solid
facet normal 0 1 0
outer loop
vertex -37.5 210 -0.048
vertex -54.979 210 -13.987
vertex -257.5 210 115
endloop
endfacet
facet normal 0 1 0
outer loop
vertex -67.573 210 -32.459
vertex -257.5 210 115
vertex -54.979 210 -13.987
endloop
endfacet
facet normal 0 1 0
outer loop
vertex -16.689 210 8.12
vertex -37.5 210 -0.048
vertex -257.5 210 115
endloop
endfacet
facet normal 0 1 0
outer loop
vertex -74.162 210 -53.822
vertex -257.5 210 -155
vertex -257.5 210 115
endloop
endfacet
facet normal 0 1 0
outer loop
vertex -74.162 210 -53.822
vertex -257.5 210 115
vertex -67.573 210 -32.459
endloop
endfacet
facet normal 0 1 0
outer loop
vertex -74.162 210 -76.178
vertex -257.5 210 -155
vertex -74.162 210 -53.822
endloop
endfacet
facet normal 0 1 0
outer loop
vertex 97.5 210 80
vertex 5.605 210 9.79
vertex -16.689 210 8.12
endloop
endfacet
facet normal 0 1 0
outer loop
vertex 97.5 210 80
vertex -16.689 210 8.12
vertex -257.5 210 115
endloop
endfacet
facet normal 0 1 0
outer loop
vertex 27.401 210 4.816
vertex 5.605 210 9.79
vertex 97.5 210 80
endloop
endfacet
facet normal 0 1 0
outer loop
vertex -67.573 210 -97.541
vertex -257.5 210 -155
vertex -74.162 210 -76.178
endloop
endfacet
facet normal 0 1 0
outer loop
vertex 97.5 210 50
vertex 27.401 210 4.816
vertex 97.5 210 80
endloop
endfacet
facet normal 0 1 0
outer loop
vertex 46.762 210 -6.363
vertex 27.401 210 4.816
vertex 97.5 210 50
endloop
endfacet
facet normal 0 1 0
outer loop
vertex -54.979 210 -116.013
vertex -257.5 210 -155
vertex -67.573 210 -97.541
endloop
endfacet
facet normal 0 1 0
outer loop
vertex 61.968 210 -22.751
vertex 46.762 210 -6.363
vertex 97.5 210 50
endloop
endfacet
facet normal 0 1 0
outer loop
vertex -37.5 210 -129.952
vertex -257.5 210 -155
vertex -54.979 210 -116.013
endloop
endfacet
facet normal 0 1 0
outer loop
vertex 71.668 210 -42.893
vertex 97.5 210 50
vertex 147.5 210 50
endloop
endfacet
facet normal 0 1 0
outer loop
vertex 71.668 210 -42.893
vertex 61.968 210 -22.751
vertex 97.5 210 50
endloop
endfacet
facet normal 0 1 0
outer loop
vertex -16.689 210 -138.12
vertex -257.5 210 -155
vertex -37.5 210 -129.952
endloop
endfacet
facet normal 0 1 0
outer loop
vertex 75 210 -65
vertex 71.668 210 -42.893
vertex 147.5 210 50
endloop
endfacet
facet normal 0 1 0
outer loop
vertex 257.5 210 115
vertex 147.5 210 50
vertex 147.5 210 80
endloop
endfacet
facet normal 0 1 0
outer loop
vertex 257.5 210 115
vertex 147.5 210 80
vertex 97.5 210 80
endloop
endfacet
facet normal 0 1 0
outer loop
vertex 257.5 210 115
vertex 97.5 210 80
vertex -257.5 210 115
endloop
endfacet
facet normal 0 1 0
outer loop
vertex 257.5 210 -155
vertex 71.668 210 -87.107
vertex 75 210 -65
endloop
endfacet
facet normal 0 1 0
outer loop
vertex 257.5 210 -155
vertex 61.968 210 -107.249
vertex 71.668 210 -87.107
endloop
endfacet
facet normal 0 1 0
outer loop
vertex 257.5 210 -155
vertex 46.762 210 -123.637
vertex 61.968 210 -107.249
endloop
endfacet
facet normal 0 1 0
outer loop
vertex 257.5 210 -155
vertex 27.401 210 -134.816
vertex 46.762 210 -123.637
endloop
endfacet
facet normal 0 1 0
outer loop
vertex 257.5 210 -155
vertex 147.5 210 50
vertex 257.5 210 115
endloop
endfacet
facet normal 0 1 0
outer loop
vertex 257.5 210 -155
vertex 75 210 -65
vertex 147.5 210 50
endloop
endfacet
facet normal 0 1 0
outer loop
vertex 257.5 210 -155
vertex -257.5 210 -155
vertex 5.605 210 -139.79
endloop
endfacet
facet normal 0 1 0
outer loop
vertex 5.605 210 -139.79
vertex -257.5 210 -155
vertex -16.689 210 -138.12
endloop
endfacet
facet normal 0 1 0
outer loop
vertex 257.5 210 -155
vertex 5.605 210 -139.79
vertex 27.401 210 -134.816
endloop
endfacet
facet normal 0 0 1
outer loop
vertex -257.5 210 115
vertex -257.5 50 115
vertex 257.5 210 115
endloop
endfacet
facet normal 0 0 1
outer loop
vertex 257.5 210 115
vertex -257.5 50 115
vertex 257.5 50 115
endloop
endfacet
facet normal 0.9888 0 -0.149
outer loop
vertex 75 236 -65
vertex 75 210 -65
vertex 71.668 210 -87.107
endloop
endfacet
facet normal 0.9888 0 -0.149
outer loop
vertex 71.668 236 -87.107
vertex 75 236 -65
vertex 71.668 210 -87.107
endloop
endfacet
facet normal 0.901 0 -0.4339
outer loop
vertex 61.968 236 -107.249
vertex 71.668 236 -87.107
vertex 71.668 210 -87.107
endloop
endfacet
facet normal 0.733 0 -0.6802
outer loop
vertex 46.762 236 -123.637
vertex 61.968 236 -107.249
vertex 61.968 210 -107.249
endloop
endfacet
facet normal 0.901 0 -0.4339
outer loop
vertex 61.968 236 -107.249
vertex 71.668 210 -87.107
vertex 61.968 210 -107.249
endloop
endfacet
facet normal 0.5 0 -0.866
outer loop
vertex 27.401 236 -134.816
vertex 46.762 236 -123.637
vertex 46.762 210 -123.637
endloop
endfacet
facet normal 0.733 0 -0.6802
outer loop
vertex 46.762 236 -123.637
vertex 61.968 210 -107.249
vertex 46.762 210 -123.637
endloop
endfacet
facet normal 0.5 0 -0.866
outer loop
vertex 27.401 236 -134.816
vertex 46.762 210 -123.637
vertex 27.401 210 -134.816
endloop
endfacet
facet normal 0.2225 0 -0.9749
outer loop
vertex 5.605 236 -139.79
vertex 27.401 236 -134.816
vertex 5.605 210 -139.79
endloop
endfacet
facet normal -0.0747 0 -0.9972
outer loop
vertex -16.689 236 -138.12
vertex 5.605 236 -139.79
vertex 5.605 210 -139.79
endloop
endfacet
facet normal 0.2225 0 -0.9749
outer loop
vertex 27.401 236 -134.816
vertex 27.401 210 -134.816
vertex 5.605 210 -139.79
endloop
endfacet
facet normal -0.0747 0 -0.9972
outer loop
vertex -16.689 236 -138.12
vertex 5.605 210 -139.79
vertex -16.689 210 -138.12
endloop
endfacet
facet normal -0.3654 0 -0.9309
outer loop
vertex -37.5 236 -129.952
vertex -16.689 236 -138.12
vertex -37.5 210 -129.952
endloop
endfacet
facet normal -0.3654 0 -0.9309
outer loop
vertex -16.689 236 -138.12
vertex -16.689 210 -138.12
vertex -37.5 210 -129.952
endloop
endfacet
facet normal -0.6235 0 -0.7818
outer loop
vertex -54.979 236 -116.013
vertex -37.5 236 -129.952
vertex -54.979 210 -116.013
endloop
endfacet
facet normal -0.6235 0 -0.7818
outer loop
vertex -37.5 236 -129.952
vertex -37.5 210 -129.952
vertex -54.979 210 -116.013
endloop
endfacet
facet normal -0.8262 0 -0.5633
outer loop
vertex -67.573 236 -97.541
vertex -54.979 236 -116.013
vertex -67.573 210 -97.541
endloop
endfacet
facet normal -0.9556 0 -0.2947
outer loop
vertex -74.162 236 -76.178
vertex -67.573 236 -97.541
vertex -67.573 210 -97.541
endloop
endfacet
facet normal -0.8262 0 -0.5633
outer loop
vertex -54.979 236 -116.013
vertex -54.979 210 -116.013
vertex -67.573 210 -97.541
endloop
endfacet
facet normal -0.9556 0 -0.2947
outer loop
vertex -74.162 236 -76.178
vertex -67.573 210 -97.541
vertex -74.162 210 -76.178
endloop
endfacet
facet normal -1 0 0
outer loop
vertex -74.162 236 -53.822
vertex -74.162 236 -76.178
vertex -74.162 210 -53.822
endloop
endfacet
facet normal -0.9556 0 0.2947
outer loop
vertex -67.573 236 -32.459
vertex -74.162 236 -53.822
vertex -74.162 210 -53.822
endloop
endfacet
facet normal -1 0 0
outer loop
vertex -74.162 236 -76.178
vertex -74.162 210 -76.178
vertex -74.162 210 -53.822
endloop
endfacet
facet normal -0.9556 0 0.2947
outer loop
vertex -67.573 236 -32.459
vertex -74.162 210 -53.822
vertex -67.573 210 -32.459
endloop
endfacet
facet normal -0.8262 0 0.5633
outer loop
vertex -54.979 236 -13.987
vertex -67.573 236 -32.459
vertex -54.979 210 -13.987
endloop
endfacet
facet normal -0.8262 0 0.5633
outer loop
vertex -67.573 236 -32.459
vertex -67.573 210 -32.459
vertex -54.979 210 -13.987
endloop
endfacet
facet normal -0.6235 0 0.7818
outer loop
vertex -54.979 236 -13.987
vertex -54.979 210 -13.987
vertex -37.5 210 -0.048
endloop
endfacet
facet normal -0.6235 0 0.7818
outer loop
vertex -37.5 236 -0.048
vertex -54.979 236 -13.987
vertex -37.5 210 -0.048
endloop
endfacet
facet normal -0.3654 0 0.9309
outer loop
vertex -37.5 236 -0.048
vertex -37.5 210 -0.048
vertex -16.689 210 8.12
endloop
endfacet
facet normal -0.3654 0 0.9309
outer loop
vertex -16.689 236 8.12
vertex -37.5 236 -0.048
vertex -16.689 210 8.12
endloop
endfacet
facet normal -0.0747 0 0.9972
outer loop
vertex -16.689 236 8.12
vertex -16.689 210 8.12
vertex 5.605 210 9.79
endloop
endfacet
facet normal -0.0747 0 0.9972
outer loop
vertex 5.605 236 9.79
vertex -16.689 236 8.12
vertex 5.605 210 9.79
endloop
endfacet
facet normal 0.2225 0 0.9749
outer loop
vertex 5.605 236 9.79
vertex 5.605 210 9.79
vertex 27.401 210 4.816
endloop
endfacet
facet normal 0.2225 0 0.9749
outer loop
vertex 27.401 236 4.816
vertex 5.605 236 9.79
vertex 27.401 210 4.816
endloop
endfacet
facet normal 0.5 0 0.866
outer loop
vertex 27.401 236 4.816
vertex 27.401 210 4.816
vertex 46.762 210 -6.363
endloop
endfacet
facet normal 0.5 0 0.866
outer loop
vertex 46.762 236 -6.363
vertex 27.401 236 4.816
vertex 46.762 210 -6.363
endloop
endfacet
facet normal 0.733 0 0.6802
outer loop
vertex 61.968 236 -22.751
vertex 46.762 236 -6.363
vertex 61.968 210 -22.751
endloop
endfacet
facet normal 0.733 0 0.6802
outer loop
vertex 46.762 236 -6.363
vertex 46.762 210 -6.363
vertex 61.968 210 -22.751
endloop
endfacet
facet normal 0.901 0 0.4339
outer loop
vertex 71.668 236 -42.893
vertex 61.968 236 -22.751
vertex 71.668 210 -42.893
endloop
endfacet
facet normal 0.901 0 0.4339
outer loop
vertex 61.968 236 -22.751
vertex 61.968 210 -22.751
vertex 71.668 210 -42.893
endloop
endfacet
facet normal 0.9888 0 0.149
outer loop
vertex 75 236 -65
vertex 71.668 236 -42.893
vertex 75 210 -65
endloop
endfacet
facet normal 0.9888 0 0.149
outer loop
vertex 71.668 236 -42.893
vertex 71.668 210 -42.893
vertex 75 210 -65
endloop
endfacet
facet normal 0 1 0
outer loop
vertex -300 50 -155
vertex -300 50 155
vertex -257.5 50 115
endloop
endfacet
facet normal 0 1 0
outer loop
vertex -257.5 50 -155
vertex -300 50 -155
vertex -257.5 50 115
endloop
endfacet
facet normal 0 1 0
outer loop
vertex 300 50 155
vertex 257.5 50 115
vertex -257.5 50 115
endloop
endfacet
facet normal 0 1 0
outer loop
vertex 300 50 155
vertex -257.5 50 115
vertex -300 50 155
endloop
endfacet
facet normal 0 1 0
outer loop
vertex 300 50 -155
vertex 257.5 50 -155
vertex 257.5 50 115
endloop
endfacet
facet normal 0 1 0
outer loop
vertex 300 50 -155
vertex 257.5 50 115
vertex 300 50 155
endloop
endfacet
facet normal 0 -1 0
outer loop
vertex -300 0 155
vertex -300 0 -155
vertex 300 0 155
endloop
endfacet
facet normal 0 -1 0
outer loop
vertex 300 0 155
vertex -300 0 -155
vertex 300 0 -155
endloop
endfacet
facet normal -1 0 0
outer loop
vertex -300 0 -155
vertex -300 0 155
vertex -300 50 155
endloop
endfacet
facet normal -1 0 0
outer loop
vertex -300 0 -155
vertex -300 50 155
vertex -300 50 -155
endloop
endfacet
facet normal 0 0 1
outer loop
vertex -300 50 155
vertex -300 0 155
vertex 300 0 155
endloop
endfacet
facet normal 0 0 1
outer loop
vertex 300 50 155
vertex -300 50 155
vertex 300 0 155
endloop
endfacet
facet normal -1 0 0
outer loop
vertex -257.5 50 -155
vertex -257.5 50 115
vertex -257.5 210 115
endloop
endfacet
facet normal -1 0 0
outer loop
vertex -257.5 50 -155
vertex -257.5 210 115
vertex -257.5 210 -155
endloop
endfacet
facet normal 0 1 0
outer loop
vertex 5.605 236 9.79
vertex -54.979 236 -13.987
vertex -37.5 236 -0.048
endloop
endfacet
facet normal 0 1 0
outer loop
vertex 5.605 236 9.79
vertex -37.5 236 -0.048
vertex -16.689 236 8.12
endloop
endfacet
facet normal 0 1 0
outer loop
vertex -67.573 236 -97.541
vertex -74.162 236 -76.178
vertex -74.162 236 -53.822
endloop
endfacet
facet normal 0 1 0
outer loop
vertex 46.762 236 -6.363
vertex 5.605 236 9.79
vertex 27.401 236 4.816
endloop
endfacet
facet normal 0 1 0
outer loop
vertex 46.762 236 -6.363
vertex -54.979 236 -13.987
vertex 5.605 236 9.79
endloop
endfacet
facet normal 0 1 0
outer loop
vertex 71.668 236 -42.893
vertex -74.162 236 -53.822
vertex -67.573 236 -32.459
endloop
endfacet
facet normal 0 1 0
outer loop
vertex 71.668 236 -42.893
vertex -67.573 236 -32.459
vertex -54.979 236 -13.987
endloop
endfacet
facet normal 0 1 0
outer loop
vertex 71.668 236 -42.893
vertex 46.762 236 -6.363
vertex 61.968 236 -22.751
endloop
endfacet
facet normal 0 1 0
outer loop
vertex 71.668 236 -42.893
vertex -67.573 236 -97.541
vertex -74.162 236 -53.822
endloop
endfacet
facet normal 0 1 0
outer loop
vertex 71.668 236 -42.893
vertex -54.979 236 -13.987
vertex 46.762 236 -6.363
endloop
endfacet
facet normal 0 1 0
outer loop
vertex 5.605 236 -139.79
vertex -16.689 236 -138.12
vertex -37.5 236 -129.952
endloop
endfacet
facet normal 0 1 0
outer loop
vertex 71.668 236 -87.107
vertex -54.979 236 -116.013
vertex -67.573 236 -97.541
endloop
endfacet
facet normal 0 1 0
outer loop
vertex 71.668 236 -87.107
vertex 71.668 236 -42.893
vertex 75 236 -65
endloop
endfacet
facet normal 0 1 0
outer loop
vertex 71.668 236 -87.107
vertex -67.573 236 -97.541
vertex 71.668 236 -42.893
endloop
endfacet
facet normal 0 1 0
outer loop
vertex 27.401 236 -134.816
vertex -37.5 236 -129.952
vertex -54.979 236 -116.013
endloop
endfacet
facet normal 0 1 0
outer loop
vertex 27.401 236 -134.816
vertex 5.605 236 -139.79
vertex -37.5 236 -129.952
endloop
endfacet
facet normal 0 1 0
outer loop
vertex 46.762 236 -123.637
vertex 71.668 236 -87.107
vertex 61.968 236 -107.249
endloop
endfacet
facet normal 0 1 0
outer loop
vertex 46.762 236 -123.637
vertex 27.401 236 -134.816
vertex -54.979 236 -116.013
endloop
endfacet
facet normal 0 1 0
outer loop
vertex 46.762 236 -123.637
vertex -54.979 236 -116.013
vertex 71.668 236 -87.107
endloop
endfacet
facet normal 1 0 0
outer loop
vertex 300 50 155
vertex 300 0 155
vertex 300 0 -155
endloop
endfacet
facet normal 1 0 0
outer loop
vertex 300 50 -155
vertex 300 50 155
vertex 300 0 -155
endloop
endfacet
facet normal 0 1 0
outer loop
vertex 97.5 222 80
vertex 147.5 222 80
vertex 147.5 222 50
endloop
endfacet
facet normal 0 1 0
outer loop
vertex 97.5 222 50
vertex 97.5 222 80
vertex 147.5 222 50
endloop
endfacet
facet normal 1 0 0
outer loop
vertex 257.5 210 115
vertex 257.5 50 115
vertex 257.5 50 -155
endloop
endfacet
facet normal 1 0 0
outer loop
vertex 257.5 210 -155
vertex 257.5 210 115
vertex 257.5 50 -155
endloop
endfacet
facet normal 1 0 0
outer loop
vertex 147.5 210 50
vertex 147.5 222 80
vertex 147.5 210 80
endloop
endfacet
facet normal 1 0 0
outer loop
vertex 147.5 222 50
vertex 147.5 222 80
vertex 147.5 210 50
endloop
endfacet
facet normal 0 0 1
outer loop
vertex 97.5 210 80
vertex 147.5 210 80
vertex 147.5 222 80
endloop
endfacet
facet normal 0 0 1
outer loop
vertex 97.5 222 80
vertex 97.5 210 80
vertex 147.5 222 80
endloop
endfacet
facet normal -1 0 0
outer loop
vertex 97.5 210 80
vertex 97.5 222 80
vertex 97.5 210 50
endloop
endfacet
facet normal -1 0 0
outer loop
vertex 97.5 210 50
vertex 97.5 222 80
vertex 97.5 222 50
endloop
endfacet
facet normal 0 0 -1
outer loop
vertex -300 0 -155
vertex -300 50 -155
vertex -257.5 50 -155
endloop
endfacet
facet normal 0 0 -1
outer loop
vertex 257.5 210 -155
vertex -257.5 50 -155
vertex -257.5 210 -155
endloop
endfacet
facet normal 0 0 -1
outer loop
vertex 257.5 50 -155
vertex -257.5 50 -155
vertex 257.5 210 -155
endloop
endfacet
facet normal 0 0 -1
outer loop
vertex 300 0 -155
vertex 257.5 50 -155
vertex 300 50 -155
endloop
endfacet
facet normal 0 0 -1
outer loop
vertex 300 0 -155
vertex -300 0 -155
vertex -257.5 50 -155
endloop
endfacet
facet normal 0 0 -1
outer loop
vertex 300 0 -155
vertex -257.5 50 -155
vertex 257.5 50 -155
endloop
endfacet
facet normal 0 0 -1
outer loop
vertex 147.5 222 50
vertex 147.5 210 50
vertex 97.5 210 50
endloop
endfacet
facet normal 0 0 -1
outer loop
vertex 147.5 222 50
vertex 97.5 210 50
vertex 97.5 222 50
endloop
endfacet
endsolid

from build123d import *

# Parameters (mm, degrees)
SKETCH1_W           = 600
SKETCH1_H           = 310
BOSS_EXTRUDE1_DEPTH = 50
SKETCH2_W           = 515
SKETCH2_H           = 270
BOSS_EXTRUDE2_DEPTH = 160
SKETCH3_R           = 75
BOSS_EXTRUDE3_DEPTH = 26
SKETCH4_W           = 30
SKETCH4_H           = 12
BOSS_EXTRUDE4_DEPTH = 50


with BuildPart() as part:
    # Sketch1 → Boss-Extrude1 (new body)
    with BuildSketch(Plane(origin=(0, 0, 0), x_dir=(1, 0, 0), z_dir=(0, 1, 0))):
        Rectangle(SKETCH1_W, SKETCH1_H)
    extrude(amount=BOSS_EXTRUDE1_DEPTH)

    # Sketch2 → Boss-Extrude2 (add)
    with BuildSketch(Plane(origin=(0, 50, 0), x_dir=(1, 0, 0), z_dir=(0, 1, 0))):
        with Locations((0, 20)):
            Rectangle(SKETCH2_W, SKETCH2_H)
    extrude(amount=BOSS_EXTRUDE2_DEPTH)

    # Sketch3 → Boss-Extrude3 (add)
    with BuildSketch(Plane(origin=(0, 210, 0), x_dir=(1, 0, 0), z_dir=(0, 1, 0))):
        with Locations((0, 65)):
            Circle(SKETCH3_R)
    extrude(amount=BOSS_EXTRUDE3_DEPTH)

    # Sketch4 → Boss-Extrude4 (add)
    with BuildSketch(Plane(origin=(147.5, 0, 0), x_dir=(0, 0, -1), z_dir=(1, 0, 0))):
        with Locations((-65, 216)):
            Rectangle(SKETCH4_W, SKETCH4_H)
    extrude(amount=-BOSS_EXTRUDE4_DEPTH)


solid = part.part
